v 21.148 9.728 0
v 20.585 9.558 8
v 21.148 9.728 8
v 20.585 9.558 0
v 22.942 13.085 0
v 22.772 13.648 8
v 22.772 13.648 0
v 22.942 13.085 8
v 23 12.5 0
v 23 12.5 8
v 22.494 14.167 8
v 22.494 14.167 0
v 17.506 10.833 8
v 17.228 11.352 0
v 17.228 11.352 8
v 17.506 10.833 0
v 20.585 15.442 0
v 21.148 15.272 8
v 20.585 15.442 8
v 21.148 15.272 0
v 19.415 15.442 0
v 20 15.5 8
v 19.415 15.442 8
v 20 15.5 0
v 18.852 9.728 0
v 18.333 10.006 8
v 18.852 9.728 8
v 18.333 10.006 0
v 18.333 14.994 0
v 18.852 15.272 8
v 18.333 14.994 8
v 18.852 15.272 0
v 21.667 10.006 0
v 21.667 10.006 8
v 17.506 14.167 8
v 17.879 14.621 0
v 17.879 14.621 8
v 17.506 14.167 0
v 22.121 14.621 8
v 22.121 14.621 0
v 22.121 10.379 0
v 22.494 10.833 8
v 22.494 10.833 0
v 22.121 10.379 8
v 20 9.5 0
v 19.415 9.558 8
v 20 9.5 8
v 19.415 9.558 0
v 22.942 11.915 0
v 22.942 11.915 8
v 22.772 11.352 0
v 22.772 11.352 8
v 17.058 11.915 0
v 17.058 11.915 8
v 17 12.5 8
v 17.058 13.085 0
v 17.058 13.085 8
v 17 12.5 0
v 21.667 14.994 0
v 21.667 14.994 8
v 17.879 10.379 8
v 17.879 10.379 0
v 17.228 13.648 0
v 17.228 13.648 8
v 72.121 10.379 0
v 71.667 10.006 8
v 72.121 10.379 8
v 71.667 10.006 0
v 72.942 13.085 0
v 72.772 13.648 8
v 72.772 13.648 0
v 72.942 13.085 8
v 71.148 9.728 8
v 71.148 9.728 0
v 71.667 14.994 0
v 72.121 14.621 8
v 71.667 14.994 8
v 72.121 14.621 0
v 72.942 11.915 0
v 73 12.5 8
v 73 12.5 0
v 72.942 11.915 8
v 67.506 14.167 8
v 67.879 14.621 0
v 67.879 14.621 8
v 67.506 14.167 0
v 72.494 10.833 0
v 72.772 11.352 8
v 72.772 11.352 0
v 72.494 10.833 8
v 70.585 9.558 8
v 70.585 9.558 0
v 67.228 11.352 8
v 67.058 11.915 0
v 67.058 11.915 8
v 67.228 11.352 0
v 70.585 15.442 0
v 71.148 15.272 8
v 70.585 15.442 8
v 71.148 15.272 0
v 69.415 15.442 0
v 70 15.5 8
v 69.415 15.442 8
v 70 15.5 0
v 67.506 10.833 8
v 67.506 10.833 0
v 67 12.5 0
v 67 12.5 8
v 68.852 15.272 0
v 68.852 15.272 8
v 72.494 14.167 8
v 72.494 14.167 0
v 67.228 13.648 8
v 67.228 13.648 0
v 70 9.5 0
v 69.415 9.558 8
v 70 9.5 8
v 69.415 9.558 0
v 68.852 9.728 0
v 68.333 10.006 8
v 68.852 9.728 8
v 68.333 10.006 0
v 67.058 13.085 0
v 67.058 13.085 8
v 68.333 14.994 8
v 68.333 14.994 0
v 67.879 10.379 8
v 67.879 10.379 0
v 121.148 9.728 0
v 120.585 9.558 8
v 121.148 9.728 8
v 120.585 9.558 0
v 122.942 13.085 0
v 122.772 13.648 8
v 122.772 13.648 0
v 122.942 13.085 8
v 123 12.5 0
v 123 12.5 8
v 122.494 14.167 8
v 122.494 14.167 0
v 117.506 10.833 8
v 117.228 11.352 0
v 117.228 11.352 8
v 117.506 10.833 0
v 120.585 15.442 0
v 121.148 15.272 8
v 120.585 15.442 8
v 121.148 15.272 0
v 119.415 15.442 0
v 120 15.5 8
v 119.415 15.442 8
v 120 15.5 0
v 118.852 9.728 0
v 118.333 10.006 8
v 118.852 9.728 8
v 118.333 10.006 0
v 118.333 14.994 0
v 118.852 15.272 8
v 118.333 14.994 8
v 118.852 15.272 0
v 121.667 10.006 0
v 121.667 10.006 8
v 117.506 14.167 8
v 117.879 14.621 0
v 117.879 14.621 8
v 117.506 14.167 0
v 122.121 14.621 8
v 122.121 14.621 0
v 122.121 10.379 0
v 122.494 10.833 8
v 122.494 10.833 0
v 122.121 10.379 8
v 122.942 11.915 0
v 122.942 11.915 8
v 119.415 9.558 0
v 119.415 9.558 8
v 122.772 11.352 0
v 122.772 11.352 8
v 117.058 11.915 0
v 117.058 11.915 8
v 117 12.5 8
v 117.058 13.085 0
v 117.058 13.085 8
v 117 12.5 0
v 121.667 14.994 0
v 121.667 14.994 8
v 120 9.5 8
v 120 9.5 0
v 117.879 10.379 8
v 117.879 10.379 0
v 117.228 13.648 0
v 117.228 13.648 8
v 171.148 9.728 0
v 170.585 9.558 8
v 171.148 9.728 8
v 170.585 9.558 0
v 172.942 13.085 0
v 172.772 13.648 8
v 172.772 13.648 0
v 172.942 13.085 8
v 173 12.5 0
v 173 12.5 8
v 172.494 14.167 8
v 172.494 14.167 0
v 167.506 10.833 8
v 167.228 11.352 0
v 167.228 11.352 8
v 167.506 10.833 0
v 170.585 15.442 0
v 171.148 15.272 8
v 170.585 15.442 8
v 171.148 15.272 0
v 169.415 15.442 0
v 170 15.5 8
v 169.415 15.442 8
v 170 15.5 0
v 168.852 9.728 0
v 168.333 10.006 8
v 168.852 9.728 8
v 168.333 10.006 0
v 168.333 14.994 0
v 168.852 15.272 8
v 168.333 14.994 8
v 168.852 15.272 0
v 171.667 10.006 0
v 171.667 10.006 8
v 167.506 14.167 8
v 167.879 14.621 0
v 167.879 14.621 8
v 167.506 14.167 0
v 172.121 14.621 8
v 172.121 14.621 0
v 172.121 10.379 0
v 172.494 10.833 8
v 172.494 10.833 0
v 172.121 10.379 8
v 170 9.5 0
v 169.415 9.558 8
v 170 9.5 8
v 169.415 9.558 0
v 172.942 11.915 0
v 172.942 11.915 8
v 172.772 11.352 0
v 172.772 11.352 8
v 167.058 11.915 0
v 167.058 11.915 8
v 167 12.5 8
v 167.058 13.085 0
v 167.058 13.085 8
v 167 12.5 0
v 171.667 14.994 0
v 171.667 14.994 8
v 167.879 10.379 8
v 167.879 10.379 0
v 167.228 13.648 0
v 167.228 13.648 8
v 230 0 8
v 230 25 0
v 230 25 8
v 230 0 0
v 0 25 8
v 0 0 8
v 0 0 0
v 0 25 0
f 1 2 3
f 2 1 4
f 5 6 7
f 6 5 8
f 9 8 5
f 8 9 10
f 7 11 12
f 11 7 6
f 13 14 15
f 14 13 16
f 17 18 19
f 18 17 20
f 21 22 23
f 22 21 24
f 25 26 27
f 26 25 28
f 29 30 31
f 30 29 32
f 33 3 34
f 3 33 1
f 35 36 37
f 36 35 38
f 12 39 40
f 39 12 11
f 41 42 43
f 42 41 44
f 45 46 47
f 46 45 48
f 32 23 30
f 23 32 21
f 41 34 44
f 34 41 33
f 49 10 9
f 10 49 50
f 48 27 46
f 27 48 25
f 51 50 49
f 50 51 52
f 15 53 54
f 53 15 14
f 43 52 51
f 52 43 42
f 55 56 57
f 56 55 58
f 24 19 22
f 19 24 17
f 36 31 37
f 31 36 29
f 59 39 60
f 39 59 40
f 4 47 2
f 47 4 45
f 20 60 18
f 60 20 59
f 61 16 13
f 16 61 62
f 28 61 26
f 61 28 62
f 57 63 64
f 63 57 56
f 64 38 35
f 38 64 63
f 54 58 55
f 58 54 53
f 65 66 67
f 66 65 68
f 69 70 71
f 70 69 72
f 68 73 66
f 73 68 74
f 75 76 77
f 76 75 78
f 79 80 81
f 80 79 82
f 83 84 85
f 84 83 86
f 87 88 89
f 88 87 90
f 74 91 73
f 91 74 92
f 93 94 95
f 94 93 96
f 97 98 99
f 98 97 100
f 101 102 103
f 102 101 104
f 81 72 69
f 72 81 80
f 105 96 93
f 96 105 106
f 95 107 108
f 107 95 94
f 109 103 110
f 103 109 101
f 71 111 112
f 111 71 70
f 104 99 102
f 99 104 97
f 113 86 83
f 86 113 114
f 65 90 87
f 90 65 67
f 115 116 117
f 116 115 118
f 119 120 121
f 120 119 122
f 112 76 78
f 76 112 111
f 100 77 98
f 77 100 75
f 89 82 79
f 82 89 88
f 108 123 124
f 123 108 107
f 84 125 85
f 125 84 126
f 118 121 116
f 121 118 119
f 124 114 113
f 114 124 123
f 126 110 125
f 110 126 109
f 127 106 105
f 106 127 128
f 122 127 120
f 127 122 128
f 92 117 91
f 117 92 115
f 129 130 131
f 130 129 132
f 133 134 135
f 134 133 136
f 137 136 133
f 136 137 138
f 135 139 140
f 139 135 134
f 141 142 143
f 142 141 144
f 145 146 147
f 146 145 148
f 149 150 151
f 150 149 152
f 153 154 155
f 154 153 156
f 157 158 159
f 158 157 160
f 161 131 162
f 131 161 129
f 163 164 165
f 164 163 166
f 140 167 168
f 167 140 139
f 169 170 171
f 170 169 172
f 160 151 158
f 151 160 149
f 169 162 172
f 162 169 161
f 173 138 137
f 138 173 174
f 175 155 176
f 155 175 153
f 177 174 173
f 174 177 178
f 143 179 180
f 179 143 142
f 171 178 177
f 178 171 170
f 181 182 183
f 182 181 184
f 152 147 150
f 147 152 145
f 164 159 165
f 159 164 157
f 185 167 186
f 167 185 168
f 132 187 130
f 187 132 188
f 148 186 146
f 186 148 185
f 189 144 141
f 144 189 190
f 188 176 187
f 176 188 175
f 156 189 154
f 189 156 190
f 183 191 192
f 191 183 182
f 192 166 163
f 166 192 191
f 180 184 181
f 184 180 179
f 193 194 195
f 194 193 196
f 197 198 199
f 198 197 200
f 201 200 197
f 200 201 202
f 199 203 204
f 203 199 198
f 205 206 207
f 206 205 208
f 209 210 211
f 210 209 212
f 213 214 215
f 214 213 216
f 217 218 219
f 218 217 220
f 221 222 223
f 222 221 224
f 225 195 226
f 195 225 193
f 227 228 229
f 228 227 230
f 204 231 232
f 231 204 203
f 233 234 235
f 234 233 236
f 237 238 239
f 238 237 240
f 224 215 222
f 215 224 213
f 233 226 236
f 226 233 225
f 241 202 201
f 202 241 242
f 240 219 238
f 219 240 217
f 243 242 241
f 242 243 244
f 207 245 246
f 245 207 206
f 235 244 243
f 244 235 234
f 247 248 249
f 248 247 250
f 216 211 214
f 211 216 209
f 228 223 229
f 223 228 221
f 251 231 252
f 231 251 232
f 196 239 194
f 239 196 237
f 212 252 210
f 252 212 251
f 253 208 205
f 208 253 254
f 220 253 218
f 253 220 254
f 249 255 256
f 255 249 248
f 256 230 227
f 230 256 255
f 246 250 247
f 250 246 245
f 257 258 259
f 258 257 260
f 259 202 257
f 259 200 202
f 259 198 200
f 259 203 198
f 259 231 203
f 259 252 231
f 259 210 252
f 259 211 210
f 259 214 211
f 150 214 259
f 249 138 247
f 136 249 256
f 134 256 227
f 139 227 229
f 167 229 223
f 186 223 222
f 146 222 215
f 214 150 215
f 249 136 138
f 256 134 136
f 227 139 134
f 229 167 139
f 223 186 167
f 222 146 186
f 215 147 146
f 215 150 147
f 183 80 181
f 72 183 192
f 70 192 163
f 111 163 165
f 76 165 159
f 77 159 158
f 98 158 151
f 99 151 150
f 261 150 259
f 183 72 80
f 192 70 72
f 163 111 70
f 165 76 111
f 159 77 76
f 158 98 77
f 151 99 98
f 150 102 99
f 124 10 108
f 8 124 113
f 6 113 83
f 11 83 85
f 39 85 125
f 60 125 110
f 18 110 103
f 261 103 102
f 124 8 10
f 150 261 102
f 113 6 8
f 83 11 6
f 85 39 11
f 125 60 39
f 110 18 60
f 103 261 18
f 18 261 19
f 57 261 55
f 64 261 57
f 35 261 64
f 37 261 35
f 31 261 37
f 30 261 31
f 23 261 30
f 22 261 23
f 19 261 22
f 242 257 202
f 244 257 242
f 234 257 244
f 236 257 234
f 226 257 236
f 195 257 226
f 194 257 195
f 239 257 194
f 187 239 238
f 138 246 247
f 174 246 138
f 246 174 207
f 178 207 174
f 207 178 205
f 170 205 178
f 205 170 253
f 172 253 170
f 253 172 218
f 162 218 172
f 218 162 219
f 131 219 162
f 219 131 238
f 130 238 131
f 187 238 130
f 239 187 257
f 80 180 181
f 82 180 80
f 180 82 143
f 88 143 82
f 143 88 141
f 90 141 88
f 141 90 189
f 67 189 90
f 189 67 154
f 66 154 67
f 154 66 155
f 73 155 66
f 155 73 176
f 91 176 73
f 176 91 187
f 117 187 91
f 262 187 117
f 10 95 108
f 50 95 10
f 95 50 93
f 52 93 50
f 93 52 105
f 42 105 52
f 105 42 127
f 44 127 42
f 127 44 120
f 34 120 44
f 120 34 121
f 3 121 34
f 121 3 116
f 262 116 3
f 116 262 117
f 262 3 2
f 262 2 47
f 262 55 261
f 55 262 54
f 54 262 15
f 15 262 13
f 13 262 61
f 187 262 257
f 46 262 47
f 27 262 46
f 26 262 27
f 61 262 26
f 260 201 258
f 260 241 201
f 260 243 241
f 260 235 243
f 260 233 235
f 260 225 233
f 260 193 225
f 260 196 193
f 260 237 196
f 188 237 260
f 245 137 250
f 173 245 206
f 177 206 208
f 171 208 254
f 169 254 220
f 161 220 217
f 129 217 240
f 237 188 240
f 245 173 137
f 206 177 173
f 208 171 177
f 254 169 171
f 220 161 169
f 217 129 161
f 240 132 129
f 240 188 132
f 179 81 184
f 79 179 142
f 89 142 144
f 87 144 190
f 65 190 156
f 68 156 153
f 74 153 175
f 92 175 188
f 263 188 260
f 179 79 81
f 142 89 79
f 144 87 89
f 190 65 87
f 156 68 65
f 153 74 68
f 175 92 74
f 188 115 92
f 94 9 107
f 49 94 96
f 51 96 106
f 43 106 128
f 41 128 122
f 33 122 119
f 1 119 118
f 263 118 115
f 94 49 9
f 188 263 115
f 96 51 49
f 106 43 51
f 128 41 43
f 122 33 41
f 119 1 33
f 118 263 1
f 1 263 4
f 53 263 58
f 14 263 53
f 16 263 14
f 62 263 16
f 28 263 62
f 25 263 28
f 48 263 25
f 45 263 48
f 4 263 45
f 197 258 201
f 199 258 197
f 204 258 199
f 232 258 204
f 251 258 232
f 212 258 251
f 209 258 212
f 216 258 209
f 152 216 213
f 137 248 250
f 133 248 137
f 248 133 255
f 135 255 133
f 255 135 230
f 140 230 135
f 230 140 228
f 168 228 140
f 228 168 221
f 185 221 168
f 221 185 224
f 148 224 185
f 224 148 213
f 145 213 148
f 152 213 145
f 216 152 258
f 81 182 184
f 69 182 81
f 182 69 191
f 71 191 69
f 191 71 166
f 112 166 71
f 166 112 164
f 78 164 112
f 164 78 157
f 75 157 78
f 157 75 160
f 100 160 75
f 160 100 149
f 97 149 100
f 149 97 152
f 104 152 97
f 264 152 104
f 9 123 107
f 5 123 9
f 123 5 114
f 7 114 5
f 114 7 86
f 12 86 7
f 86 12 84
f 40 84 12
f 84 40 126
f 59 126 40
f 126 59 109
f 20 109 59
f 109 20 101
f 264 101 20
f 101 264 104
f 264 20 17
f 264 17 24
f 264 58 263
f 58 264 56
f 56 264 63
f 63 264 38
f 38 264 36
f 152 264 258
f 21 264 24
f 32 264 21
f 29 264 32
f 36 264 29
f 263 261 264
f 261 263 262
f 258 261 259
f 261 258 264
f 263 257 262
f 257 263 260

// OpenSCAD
$fn = 32;

// ----------------------------------------------------------------------
// Long rail: 200-250 mm mounting rail
// ----------------------------------------------------------------------

// --- parameters (mm) ---
rail_l = 230;             // rail length, X
rail_w = 25;              // rail width, Y
rail_t = 8;               // rail thickness, Z
hole_d = 6;               // mounting hole diameter
hole_start = 20;          // first hole offset from the end
hole_pitch = 50;          // hole pitch
holes = 4;                // number of holes

difference() {
  cube([rail_l, rail_w, rail_t]);
  for (i = [0 : holes - 1])
    translate([hole_start + i * hole_pitch, rail_w / 2, -1])
      cylinder(h = rail_t + 2, d = hole_d);
}
